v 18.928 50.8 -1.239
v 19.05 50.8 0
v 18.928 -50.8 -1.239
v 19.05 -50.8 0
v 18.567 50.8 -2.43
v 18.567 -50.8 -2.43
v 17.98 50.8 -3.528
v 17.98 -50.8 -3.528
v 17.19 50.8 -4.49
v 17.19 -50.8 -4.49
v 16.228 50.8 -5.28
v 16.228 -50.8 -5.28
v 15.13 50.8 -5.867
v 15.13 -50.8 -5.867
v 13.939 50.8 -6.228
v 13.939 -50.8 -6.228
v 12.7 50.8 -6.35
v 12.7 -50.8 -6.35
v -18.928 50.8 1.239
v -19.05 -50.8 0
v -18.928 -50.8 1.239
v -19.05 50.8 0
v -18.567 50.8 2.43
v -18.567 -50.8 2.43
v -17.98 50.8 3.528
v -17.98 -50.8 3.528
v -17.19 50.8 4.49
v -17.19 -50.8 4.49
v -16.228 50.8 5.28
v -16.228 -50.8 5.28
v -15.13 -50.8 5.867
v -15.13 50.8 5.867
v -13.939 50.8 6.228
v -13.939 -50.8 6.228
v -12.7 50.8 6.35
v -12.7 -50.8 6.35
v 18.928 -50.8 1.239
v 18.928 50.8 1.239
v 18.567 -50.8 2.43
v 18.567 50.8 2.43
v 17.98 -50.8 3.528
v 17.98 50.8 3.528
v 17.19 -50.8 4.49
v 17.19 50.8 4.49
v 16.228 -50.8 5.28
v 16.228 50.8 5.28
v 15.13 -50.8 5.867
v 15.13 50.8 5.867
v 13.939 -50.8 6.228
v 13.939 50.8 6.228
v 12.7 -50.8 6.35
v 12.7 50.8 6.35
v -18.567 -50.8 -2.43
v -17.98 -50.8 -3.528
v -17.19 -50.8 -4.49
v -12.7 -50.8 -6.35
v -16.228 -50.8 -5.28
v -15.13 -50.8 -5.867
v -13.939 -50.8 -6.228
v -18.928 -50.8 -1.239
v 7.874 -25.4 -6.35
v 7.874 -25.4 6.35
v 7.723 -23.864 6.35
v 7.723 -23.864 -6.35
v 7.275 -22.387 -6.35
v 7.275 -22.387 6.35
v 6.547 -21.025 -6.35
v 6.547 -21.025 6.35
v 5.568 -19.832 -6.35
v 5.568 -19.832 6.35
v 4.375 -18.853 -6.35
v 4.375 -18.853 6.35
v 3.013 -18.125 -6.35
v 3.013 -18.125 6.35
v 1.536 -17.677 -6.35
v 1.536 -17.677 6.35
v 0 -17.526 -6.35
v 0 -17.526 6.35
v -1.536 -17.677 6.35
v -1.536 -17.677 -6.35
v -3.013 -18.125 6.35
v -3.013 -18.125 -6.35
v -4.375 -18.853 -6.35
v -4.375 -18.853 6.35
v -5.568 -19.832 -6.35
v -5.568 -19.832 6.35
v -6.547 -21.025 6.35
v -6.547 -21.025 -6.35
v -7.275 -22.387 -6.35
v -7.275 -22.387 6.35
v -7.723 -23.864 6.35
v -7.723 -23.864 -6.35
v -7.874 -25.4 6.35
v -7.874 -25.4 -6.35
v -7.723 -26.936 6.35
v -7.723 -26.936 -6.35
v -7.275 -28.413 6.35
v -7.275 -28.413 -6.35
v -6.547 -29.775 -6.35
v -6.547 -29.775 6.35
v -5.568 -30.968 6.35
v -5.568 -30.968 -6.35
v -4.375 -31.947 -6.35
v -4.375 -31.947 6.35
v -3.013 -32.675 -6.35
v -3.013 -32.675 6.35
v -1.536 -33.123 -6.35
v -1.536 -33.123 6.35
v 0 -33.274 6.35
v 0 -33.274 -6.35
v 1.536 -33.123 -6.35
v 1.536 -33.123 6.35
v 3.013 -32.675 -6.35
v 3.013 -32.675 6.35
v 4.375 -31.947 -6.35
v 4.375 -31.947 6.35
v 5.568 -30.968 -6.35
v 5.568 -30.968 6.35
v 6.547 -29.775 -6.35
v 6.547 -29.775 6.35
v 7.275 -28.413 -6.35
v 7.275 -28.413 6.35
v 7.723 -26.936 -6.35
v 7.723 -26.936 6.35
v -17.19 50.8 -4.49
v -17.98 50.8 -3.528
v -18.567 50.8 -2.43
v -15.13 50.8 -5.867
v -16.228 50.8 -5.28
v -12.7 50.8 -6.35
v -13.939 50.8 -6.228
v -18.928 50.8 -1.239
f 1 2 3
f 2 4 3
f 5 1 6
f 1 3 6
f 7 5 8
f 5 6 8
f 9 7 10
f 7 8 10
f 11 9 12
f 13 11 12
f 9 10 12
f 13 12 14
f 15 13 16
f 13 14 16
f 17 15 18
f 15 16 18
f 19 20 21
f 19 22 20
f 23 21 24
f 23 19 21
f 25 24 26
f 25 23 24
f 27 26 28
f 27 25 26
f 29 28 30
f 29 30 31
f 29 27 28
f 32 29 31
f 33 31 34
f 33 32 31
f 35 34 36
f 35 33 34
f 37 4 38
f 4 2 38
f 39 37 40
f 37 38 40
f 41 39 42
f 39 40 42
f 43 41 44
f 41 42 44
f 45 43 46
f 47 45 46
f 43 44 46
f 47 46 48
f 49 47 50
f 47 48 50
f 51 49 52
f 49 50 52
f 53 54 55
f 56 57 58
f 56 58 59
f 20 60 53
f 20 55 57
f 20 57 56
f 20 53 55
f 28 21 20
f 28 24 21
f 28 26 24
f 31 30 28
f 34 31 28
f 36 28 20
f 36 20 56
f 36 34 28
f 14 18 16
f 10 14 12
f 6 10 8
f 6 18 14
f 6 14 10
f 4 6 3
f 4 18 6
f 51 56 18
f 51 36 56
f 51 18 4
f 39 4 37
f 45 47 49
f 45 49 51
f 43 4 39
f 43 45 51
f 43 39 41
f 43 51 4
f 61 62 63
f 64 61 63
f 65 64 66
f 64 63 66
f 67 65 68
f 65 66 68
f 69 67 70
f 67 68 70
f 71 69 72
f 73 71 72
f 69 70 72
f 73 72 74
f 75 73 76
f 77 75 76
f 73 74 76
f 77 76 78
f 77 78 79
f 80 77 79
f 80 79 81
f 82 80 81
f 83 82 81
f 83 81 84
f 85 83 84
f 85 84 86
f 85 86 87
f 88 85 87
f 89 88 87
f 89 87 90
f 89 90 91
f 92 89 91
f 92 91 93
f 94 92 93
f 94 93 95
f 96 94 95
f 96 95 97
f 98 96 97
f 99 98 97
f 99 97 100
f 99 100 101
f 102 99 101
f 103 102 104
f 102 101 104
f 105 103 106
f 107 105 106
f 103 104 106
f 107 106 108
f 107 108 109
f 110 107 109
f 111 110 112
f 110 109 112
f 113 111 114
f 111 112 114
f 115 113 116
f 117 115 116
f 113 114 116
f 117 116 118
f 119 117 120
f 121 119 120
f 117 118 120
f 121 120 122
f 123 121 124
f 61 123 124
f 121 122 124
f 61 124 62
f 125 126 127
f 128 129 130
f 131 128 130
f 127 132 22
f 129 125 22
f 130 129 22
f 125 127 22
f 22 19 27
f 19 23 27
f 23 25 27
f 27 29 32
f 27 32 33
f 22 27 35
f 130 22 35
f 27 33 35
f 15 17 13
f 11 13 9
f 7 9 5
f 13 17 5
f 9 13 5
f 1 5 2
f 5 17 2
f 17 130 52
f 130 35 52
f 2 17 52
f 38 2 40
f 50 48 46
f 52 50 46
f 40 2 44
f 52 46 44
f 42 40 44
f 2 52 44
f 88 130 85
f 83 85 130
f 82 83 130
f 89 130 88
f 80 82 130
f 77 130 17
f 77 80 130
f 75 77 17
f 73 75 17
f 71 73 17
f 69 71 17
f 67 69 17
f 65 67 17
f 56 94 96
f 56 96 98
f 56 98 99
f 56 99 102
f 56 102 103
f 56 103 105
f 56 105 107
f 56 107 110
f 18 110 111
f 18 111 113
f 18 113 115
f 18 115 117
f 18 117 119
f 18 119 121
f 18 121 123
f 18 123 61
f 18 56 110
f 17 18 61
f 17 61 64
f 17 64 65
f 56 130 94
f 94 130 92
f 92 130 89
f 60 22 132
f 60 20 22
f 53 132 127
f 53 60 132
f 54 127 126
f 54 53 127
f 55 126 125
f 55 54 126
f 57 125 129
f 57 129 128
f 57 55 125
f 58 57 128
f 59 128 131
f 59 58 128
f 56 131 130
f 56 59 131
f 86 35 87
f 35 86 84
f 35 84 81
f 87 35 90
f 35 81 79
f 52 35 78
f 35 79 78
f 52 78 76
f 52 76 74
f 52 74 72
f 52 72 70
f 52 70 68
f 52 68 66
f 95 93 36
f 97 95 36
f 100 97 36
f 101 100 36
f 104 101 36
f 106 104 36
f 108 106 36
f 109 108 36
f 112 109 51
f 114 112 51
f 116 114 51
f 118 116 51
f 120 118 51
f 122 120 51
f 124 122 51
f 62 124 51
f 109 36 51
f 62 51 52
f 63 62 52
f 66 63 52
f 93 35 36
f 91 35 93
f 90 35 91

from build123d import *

# Parameters (mm, degrees)
F0_W     = 38.10014986
F0_H     = 12.7
F1_DEPTH = 50.8
F2_R     = 6.34999
F3_R     = 7.874
F4_DEPTH = 12.701


# Not quite as in the source:
# - a fillet or chamfer is up to 0.001 mm smaller than in the source, because OpenCascade refuses the exact size


with BuildPart() as f1:
    # F0 (on Front) → F1 (new body, symmetric)
    with BuildSketch(Plane.XZ):
        Rectangle(F0_W, F0_H)
    extrude(amount=F1_DEPTH, both=True)

    # F2 (radius 6.35 in the source; OpenCascade refuses exactly that, so slightly less here)
    f2_edges = [f1.edges().sort_by_distance(p)[0] for p in [
        (-19.050075, 0, 6.35),
        (19.050075, 0, 6.35),
        (19.050075, 0, -6.35),
        (-19.050075, 0, -6.35),
    ]]
    fillet(f2_edges, radius=F2_R)

    # F3 (on face) → F4 (cut, through all)
    with BuildSketch(Plane.XY.offset(6.35)):
        with Locations((0, -25.4)):
            Circle(F3_R)
    extrude(amount=-F4_DEPTH, mode=Mode.SUBTRACT)


solid = f1.part
